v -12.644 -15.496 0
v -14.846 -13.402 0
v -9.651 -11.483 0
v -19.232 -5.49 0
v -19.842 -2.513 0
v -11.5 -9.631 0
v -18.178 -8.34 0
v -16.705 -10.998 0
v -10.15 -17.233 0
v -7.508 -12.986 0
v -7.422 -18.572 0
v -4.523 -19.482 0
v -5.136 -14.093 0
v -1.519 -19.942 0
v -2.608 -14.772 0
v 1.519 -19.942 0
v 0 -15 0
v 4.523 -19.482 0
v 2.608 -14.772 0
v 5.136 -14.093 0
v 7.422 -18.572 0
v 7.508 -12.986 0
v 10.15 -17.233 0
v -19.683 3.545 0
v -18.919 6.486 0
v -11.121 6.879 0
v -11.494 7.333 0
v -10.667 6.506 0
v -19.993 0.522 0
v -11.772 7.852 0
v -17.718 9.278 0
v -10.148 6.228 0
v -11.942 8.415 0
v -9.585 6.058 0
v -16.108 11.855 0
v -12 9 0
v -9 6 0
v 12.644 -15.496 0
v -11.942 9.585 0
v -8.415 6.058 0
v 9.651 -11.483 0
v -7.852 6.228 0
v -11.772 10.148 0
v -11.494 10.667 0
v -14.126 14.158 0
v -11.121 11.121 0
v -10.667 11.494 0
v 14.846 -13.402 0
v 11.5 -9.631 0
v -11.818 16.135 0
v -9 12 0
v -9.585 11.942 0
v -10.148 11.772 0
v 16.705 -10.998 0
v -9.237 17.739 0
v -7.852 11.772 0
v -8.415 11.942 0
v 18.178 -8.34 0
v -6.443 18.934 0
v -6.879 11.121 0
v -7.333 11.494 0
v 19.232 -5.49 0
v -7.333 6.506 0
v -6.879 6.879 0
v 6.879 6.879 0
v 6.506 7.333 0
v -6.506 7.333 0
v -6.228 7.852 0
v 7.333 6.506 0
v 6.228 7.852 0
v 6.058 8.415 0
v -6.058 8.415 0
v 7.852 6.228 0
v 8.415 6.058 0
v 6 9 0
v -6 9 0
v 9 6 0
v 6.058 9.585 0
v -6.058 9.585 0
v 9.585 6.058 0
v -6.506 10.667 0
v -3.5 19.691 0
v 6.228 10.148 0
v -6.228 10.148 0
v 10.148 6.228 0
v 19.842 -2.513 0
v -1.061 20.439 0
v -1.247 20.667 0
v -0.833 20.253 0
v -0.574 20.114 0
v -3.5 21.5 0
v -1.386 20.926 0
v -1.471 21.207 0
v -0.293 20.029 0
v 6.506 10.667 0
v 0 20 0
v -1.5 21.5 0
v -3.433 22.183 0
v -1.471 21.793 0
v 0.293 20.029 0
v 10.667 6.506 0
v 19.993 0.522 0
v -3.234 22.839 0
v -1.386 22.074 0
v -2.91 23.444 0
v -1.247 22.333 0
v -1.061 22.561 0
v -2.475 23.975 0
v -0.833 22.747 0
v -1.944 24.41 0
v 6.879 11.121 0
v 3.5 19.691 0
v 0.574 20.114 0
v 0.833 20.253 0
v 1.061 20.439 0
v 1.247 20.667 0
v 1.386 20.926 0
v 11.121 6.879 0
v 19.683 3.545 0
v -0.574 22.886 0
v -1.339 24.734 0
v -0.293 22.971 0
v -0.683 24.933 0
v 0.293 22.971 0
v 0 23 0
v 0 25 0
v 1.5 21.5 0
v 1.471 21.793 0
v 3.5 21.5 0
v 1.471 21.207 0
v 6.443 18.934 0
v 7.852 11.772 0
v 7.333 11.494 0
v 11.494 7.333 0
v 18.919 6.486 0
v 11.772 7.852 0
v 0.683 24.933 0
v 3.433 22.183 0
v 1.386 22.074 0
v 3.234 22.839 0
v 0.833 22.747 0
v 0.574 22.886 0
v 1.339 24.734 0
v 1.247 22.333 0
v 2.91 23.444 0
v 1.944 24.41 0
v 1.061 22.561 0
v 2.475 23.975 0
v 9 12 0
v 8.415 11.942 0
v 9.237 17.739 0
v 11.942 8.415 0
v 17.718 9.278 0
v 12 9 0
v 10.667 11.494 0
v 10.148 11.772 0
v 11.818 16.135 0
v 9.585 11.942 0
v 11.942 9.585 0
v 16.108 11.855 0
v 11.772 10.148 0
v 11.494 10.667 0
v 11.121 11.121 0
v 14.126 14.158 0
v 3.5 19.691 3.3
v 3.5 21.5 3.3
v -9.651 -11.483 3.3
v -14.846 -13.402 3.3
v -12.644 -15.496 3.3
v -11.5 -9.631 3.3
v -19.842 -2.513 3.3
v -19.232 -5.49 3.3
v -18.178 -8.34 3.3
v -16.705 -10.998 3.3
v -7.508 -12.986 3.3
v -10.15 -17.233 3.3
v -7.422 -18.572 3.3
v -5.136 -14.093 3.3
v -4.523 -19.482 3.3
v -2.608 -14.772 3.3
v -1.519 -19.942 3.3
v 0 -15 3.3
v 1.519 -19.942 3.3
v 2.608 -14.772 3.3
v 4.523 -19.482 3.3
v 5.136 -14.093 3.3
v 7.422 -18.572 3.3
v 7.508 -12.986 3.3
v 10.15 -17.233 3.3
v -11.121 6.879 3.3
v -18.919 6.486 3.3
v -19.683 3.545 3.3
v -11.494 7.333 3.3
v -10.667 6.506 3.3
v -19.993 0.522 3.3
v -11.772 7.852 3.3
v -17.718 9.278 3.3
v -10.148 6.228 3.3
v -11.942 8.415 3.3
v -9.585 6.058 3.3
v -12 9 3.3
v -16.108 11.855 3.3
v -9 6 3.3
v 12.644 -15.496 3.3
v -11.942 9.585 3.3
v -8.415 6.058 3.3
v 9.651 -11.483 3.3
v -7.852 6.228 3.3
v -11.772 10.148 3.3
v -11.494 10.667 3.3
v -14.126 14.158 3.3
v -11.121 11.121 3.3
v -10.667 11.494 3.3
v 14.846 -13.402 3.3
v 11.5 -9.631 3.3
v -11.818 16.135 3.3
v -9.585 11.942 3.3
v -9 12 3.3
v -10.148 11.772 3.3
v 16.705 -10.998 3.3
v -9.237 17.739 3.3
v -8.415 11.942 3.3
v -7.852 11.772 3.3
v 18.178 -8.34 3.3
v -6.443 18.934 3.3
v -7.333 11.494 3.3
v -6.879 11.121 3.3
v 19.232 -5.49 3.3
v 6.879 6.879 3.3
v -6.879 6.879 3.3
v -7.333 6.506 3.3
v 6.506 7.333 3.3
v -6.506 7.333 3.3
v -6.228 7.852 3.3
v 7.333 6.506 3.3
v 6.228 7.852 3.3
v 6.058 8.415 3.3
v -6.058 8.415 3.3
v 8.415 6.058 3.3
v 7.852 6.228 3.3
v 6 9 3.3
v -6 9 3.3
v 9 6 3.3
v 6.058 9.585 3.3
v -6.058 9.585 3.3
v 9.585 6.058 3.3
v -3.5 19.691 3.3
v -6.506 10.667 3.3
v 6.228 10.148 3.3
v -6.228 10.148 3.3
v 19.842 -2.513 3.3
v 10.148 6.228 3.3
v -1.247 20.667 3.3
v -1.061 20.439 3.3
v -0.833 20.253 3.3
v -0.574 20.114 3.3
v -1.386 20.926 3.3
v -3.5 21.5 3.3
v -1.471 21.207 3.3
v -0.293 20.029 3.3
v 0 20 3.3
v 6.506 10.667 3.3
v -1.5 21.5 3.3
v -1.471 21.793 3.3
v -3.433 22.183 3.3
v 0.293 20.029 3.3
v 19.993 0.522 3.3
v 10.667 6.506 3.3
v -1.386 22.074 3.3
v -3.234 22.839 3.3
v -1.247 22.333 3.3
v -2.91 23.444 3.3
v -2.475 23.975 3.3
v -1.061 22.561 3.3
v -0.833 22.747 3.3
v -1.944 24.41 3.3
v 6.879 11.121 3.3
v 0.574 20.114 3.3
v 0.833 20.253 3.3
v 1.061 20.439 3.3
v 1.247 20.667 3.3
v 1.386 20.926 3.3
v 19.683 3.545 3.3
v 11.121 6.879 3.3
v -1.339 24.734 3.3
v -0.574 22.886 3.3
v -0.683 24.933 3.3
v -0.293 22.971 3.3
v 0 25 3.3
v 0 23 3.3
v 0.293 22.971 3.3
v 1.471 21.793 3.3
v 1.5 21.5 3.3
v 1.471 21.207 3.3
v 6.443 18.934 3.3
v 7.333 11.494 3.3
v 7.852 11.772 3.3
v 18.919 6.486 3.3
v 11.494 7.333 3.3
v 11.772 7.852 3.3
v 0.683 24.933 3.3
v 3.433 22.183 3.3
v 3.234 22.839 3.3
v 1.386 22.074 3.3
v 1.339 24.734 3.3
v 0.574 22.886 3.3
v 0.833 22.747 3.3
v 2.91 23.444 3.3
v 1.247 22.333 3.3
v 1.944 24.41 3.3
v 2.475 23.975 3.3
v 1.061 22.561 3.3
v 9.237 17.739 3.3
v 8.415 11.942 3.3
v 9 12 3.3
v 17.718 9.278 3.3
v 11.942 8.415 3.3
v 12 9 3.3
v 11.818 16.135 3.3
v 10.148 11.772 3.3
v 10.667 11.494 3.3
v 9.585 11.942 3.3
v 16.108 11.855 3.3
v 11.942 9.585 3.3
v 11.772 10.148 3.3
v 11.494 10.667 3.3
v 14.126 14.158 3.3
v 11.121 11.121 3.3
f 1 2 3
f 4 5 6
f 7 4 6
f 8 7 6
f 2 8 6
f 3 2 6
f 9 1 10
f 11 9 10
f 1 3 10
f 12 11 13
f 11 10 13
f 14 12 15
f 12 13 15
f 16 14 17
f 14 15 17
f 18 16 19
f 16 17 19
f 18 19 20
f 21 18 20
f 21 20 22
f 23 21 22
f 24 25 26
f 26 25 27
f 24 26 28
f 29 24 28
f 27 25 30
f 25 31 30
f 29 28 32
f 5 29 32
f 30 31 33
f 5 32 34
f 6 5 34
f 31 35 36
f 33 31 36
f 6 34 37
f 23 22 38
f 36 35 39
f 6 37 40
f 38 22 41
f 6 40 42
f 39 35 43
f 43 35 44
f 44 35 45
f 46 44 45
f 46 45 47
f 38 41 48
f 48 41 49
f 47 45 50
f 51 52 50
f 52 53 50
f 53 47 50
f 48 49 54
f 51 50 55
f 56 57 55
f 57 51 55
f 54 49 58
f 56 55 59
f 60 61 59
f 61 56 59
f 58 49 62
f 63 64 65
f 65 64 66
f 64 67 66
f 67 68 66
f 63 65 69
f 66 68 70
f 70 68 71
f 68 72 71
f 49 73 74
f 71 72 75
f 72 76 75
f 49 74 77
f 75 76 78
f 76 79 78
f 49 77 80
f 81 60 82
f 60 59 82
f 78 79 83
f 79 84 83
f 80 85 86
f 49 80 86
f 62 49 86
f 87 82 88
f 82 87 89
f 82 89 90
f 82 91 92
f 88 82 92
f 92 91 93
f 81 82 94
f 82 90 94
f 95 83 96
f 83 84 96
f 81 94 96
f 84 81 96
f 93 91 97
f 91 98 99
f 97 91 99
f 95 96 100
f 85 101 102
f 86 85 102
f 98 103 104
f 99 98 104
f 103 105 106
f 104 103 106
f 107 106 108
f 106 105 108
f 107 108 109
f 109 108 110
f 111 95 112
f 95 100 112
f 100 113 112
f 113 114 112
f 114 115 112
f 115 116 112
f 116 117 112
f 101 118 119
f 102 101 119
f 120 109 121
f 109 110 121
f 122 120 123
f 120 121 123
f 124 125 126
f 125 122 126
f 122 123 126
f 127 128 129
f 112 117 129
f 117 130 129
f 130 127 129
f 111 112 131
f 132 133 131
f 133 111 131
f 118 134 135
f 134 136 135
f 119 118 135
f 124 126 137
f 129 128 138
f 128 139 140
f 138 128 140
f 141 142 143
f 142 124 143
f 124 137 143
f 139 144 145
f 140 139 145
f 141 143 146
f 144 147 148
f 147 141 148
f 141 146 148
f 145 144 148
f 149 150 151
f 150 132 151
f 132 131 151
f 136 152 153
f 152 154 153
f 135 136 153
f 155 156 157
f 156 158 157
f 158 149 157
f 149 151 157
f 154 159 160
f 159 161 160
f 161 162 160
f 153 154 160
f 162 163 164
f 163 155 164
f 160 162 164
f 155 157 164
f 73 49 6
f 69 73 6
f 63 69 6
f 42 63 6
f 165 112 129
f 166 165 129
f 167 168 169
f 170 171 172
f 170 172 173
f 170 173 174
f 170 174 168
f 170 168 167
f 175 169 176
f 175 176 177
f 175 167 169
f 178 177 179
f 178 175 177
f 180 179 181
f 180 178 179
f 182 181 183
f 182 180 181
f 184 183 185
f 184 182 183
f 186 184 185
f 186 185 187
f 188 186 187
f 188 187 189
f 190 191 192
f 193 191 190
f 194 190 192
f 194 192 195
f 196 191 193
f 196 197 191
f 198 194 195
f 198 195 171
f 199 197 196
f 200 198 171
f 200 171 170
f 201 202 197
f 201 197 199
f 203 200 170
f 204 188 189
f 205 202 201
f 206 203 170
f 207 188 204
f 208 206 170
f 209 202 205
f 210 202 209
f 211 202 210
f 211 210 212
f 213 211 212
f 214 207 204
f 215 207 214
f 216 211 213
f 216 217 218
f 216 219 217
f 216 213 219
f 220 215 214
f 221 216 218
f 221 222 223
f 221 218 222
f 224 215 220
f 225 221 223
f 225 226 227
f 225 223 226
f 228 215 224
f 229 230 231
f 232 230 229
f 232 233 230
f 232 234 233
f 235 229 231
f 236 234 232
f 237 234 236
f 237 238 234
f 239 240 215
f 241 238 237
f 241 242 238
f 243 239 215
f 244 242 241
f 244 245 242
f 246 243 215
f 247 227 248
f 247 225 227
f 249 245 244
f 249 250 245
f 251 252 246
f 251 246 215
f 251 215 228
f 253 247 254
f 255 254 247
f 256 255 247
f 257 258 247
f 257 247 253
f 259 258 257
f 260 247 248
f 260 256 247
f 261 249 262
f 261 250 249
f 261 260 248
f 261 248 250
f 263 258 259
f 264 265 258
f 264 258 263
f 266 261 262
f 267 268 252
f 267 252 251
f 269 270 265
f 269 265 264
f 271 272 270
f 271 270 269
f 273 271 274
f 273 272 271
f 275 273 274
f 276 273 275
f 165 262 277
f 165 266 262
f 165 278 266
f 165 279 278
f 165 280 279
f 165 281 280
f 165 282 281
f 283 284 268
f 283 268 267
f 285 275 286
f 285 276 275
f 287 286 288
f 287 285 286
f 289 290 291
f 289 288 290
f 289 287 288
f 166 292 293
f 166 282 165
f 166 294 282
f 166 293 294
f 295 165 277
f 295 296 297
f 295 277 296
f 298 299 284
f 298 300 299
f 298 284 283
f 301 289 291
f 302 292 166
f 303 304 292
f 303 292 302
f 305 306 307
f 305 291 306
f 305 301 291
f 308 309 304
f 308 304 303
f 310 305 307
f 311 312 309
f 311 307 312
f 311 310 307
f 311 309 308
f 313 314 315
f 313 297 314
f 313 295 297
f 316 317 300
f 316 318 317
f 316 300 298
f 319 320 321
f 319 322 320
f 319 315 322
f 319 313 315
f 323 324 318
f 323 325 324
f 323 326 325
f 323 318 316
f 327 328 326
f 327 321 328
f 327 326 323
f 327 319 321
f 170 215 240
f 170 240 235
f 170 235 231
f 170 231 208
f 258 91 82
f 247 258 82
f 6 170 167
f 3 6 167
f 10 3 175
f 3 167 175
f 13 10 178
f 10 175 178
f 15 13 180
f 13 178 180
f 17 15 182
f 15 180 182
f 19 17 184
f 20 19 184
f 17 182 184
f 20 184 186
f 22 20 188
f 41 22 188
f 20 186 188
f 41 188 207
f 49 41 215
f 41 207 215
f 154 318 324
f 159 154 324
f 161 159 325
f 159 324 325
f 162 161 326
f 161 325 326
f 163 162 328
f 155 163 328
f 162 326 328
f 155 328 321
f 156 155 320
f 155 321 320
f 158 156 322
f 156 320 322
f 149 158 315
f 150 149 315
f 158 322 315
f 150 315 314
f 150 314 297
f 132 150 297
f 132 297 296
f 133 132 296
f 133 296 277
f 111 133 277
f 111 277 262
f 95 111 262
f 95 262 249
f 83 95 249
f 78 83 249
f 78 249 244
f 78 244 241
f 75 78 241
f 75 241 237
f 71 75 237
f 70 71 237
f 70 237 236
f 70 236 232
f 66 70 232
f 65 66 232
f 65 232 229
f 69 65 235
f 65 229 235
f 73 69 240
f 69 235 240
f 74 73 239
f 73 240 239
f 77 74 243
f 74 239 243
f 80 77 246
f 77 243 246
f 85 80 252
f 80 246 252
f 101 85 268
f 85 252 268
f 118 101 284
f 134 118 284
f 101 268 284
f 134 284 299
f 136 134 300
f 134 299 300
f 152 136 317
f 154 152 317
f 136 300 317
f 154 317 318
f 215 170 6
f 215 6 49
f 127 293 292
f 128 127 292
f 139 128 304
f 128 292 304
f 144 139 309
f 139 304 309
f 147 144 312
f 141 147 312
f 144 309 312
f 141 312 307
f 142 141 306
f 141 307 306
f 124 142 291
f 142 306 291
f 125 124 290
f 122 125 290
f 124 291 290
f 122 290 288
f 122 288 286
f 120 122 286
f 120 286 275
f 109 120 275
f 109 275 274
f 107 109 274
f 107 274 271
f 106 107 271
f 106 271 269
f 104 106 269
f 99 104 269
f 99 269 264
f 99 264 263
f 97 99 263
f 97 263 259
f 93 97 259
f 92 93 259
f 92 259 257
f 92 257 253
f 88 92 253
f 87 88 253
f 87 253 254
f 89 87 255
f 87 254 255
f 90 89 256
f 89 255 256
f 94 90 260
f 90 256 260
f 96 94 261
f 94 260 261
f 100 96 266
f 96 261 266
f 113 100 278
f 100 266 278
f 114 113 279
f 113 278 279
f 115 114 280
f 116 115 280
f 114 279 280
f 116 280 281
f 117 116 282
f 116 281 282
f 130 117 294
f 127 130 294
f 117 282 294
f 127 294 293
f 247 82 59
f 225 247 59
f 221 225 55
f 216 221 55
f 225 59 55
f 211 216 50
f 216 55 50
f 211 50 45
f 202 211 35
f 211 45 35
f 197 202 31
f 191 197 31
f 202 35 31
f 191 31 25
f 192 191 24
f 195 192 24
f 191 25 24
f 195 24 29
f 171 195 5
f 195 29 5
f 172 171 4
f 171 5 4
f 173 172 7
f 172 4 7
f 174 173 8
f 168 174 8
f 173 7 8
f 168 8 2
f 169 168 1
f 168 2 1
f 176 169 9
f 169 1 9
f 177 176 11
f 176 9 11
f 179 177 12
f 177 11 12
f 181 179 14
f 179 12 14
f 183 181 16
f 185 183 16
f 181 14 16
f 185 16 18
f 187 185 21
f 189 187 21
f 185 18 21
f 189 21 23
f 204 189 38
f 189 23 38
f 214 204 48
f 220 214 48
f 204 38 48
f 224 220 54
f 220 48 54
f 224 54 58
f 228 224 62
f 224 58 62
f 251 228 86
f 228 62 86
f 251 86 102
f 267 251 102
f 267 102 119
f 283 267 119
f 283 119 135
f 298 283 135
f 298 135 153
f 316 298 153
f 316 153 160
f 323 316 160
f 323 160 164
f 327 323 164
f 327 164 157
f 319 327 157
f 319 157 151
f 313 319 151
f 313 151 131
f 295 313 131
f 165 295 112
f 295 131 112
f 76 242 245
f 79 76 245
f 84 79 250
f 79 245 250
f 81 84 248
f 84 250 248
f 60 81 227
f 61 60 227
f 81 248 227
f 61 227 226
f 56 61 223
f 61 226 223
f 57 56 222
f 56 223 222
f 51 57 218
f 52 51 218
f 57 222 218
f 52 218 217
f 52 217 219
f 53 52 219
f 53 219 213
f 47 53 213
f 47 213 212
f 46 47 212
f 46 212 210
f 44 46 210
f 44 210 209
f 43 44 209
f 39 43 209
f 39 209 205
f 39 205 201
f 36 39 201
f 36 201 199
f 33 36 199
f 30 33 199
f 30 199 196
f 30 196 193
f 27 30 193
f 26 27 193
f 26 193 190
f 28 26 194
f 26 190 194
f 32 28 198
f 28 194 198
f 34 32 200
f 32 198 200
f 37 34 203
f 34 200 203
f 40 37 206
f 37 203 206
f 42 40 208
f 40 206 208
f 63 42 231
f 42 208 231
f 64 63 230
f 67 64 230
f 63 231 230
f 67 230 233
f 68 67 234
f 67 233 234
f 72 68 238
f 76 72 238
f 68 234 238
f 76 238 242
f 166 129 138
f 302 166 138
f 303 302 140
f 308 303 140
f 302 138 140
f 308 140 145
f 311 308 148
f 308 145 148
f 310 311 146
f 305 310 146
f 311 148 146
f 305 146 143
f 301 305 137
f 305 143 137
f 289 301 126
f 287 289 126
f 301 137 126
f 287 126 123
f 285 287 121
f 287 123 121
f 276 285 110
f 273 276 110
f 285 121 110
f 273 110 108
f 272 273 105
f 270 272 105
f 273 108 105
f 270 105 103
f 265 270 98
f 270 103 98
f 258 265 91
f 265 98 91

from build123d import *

# Parameters (mm, degrees)
EXTRUDE_DEPTH   = 3.3
SKETCH001_R     = 1.5
POCKET_DEPTH    = 3.301
SKETCH002_R     = 3
POCKET001_DEPTH = 8


with BuildPart() as part:
    # Sketch → Extrude (new body)
    with BuildSketch(Plane.XY):
        with BuildLine():
            ThreePointArc((3.5, 21.5), (0, 25), (-3.5, 21.5))
            Line((-3.5, 21.5), (-3.5, 19.691369))
            ThreePointArc((-3.5, 19.691369), (0, -20), (3.5, 19.691369))
            Line((3.5, 19.691369), (3.5, 21.5))
        make_face()
    extrude(amount=EXTRUDE_DEPTH)

    # Sketch001 (on Face6 of Extrude) → Pocket (cut, through all)
    with BuildSketch(Plane.XY.offset(3.3)):
        with Locations((0, 21.5)):
            Circle(SKETCH001_R)
    extrude(amount=-POCKET_DEPTH, mode=Mode.SUBTRACT)

    # Sketch002 (on Face6 of BaseFeature) → Pocket001 (cut)
    with BuildSketch(Plane.XY.offset(3.3)):
        with Locations((-9, 9)):
            Circle(SKETCH002_R)
        with Locations((9, 9)):
            Circle(SKETCH002_R)
        with BuildLine():
            ThreePointArc((-11.5, -9.63068), (0, -15), (11.5, -9.63068))
            Line((-11.5, -9.63068), (11.5, -9.63068))
        make_face()
    extrude(amount=-POCKET001_DEPTH, mode=Mode.SUBTRACT)


solid = part.part
